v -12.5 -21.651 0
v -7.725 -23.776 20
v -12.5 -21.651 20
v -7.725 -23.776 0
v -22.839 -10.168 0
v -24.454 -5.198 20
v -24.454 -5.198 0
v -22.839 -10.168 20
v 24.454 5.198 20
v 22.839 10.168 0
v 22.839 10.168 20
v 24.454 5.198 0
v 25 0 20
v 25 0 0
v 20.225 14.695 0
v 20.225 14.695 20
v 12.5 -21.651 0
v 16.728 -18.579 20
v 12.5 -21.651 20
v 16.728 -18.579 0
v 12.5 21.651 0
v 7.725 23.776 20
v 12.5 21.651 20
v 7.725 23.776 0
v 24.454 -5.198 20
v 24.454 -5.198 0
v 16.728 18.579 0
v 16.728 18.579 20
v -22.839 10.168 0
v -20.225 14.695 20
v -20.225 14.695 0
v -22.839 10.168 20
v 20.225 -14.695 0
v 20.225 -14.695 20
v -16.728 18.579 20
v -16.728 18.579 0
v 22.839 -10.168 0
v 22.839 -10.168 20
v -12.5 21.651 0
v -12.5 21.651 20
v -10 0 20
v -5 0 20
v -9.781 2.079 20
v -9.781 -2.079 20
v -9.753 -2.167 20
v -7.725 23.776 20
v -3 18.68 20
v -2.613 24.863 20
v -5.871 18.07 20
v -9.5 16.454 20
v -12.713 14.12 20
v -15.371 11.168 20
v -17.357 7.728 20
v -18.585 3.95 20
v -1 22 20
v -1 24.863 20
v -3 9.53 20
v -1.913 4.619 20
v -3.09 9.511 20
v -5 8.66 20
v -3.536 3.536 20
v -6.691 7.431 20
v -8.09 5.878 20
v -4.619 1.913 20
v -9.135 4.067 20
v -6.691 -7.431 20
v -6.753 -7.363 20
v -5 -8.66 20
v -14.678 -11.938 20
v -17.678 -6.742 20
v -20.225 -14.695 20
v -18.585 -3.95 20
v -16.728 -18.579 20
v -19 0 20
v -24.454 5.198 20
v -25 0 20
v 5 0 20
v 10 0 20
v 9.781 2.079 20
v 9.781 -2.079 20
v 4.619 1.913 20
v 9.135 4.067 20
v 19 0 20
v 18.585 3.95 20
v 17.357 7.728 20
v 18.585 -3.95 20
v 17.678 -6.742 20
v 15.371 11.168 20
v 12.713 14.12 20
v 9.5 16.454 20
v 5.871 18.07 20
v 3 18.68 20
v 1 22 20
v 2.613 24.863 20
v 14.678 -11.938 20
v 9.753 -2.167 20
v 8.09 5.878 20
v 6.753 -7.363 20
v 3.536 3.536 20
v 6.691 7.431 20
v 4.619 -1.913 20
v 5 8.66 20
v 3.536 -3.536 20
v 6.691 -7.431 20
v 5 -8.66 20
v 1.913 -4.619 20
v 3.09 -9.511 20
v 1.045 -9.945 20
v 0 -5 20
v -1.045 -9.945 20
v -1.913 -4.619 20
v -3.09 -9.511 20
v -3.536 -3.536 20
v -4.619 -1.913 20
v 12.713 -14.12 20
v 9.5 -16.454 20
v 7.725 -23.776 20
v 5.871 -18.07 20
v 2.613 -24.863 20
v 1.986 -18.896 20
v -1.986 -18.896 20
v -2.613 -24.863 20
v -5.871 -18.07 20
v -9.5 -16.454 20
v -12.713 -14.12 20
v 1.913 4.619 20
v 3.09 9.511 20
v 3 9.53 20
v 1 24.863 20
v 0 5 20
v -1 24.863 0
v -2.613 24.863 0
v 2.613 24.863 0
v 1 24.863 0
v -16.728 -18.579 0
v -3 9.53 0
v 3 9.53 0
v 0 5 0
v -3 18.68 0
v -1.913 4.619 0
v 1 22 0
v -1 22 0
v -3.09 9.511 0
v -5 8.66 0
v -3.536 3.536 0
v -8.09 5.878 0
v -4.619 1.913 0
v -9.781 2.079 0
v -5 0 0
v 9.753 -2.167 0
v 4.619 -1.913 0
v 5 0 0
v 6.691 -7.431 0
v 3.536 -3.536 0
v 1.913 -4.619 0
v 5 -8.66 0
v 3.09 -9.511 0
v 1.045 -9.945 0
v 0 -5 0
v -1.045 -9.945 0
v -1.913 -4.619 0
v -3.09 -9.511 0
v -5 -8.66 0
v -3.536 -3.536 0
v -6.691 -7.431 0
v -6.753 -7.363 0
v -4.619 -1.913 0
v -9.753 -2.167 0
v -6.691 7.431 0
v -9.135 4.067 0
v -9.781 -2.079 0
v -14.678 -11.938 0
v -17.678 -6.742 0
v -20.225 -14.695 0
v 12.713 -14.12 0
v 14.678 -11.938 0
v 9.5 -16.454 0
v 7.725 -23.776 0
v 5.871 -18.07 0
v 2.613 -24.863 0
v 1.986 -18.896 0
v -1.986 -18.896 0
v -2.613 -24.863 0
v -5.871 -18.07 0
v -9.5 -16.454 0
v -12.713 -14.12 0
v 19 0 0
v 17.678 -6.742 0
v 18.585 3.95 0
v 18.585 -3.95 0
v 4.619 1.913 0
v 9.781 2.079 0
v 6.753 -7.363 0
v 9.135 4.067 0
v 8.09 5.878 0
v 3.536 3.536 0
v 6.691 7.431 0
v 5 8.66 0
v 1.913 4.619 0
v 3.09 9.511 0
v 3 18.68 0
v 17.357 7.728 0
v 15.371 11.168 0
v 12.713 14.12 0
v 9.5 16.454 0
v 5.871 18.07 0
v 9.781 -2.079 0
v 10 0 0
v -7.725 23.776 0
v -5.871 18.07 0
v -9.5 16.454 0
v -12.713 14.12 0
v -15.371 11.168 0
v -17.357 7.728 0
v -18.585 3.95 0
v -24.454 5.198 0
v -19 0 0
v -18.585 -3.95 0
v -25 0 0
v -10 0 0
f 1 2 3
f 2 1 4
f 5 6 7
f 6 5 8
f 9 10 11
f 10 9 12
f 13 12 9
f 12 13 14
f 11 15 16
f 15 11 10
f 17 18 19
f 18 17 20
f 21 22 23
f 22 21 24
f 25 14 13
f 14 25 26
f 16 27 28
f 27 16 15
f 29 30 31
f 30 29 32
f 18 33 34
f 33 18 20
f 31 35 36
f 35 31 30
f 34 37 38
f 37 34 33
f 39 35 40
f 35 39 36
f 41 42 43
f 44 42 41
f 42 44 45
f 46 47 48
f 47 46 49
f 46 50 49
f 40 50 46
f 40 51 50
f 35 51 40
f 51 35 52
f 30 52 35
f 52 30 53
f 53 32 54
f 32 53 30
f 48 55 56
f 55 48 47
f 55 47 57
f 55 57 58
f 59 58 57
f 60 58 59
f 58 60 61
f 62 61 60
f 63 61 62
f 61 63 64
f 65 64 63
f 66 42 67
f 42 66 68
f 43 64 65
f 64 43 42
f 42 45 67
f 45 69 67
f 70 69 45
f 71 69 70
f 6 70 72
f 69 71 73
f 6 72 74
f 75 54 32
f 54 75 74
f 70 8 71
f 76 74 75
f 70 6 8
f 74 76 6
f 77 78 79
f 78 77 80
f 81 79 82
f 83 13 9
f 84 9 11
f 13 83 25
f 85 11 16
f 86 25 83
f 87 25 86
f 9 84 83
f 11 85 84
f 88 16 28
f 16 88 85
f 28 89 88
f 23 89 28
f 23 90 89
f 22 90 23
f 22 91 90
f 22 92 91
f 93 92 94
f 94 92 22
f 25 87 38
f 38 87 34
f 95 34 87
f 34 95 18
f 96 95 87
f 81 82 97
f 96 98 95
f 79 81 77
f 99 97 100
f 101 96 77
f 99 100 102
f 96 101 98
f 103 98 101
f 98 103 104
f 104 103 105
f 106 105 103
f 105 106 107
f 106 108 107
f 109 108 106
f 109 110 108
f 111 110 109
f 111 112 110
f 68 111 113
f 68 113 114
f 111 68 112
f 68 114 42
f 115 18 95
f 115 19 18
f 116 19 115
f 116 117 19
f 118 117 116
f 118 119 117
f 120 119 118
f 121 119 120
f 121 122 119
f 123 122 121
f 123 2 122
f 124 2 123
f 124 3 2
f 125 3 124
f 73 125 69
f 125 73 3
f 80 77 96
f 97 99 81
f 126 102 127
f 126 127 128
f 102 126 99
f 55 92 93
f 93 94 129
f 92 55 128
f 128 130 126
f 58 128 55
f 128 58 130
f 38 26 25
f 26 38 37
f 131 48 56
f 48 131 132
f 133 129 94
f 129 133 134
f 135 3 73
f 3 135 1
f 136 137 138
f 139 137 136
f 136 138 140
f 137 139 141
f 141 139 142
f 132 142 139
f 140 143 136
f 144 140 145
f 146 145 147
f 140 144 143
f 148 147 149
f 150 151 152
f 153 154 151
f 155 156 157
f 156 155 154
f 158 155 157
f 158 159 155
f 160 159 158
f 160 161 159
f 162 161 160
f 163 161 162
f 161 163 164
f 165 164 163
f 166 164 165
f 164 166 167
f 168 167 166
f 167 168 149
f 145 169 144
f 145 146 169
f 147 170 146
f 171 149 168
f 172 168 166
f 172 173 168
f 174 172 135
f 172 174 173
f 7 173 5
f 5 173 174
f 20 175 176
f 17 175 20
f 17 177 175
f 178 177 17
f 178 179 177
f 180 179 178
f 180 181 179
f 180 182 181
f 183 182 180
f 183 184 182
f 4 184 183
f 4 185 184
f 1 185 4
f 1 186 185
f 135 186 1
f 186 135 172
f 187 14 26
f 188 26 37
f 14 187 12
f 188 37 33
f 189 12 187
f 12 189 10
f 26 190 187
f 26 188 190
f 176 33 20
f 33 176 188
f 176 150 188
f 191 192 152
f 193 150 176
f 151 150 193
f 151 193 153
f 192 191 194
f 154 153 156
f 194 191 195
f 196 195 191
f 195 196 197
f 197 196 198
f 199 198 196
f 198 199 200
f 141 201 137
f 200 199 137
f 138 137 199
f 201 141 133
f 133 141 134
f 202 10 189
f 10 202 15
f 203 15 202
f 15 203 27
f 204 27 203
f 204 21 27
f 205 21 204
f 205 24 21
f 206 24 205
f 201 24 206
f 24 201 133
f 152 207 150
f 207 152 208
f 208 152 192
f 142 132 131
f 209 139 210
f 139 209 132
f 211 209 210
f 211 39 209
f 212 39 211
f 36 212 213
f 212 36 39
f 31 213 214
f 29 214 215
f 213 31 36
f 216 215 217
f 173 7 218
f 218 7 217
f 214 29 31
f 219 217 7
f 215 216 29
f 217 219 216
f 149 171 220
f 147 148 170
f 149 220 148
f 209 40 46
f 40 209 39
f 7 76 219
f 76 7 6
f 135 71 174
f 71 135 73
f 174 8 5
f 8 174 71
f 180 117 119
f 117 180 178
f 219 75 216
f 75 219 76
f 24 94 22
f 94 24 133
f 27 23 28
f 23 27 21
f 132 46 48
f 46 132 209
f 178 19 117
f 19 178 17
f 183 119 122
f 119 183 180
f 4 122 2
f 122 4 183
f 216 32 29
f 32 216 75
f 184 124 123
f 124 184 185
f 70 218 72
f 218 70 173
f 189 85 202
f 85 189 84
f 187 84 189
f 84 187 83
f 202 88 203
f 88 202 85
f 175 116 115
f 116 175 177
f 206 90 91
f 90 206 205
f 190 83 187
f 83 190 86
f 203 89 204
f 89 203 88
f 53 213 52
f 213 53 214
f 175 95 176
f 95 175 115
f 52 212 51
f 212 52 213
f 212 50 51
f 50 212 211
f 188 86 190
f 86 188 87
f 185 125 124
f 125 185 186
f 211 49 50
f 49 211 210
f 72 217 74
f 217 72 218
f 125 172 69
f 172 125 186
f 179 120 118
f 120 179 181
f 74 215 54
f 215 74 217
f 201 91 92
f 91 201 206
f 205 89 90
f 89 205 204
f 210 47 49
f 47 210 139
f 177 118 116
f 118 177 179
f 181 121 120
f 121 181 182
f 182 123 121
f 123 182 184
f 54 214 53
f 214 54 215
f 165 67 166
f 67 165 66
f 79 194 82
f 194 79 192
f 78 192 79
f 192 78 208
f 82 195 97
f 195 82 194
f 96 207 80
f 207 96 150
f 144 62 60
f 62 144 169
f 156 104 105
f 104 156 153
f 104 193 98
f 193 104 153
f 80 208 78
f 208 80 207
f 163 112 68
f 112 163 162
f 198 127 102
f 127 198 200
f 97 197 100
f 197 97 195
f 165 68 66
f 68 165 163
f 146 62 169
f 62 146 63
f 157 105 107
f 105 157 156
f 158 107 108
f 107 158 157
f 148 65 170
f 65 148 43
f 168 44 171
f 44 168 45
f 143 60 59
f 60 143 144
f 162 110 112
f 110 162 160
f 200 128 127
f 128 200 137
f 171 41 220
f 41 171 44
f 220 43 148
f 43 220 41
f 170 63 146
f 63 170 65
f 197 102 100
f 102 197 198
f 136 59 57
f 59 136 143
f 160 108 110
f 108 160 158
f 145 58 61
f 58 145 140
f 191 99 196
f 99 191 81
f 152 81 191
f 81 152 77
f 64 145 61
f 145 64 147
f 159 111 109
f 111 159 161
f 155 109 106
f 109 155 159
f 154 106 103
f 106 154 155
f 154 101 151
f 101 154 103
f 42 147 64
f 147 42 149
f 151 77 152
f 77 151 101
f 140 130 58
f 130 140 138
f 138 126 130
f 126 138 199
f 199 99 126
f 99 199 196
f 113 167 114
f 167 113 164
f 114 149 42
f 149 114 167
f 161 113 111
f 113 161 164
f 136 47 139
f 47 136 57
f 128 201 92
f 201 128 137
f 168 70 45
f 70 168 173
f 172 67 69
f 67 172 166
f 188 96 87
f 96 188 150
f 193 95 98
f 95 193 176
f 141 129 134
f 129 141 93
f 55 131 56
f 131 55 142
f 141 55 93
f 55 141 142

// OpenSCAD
rad_spindle = 25;
rad_wall = 6;
dim_spindle_h = 20;
rad_inner = 10;
rad_hole = 5;

difference(){
union(){
difference(){
	cylinder(r = rad_spindle, h = dim_spindle_h);
	cylinder(r = rad_spindle - rad_wall, h = dim_spindle_h * 3, center=true);
}

difference(){
	cylinder(r = rad_inner, h = dim_spindle_h);
	cylinder(r = rad_hole, h = dim_spindle_h * 3, center=true);
}

for(rot = [0:120:360])rotate([0,0,rot + 90])
translate([ rad_inner - 2, rad_wall * -0.5,0])cube([rad_spindle - rad_inner, rad_wall, dim_spindle_h]);
}
translate([ 0, rad_spindle + 2 , 0])cube([2,10,100],center=true);
}
